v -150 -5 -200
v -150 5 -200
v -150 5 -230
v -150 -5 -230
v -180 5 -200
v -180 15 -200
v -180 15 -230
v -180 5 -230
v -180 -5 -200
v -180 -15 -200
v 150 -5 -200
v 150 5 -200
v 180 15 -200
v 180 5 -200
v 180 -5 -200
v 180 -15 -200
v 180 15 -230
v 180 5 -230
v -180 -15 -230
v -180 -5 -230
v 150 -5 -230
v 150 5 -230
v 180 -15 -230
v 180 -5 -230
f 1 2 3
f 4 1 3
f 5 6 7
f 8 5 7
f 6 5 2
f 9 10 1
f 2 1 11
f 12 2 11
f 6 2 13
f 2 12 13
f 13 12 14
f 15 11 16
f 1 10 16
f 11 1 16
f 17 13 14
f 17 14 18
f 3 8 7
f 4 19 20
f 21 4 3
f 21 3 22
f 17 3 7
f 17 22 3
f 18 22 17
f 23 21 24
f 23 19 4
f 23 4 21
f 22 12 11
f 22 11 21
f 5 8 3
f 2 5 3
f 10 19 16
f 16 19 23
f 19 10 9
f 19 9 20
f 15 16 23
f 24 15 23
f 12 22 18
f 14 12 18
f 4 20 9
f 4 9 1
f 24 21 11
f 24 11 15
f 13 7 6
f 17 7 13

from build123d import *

# Parameters (mm, degrees)
CROQUIS1_W              = 300
CROQUIS1_H              = 30
SALIENTE_EXTRUIR1_DEPTH = 15
SALIENTE_EXTRUIR2_START = 10
CROQUIS2_W              = 360
CROQUIS2_H              = 30
SALIENTE_EXTRUIR2_DEPTH = 5


with BuildPart() as part:
    # Croquis1 → Saliente-Extruir1 (new, symmetric)
    with BuildSketch(Plane(origin=(0, 0, 0), x_dir=(1, 0, 0), z_dir=(0, 1, 0))):
        with Locations((0, 215)):
            Rectangle(CROQUIS1_W, CROQUIS1_H)
    extrude(amount=SALIENTE_EXTRUIR1_DEPTH, both=True)

    # Croquis2 → Saliente-Extruir2 (add, symmetric)
    with BuildSketch(Plane(origin=(0, 0, 0), x_dir=(1, 0, 0), z_dir=(0, 1, 0)).offset(SALIENTE_EXTRUIR2_START)):
        with Locations((0, 215)):
            Rectangle(CROQUIS2_W, CROQUIS2_H)
    saliente_extruir2 = extrude(amount=SALIENTE_EXTRUIR2_DEPTH, both=True)

    # Simetría1: Saliente-Extruir2 across plane
    add(saliente_extruir2.mirror(Plane.ZX))


solid = part.part
